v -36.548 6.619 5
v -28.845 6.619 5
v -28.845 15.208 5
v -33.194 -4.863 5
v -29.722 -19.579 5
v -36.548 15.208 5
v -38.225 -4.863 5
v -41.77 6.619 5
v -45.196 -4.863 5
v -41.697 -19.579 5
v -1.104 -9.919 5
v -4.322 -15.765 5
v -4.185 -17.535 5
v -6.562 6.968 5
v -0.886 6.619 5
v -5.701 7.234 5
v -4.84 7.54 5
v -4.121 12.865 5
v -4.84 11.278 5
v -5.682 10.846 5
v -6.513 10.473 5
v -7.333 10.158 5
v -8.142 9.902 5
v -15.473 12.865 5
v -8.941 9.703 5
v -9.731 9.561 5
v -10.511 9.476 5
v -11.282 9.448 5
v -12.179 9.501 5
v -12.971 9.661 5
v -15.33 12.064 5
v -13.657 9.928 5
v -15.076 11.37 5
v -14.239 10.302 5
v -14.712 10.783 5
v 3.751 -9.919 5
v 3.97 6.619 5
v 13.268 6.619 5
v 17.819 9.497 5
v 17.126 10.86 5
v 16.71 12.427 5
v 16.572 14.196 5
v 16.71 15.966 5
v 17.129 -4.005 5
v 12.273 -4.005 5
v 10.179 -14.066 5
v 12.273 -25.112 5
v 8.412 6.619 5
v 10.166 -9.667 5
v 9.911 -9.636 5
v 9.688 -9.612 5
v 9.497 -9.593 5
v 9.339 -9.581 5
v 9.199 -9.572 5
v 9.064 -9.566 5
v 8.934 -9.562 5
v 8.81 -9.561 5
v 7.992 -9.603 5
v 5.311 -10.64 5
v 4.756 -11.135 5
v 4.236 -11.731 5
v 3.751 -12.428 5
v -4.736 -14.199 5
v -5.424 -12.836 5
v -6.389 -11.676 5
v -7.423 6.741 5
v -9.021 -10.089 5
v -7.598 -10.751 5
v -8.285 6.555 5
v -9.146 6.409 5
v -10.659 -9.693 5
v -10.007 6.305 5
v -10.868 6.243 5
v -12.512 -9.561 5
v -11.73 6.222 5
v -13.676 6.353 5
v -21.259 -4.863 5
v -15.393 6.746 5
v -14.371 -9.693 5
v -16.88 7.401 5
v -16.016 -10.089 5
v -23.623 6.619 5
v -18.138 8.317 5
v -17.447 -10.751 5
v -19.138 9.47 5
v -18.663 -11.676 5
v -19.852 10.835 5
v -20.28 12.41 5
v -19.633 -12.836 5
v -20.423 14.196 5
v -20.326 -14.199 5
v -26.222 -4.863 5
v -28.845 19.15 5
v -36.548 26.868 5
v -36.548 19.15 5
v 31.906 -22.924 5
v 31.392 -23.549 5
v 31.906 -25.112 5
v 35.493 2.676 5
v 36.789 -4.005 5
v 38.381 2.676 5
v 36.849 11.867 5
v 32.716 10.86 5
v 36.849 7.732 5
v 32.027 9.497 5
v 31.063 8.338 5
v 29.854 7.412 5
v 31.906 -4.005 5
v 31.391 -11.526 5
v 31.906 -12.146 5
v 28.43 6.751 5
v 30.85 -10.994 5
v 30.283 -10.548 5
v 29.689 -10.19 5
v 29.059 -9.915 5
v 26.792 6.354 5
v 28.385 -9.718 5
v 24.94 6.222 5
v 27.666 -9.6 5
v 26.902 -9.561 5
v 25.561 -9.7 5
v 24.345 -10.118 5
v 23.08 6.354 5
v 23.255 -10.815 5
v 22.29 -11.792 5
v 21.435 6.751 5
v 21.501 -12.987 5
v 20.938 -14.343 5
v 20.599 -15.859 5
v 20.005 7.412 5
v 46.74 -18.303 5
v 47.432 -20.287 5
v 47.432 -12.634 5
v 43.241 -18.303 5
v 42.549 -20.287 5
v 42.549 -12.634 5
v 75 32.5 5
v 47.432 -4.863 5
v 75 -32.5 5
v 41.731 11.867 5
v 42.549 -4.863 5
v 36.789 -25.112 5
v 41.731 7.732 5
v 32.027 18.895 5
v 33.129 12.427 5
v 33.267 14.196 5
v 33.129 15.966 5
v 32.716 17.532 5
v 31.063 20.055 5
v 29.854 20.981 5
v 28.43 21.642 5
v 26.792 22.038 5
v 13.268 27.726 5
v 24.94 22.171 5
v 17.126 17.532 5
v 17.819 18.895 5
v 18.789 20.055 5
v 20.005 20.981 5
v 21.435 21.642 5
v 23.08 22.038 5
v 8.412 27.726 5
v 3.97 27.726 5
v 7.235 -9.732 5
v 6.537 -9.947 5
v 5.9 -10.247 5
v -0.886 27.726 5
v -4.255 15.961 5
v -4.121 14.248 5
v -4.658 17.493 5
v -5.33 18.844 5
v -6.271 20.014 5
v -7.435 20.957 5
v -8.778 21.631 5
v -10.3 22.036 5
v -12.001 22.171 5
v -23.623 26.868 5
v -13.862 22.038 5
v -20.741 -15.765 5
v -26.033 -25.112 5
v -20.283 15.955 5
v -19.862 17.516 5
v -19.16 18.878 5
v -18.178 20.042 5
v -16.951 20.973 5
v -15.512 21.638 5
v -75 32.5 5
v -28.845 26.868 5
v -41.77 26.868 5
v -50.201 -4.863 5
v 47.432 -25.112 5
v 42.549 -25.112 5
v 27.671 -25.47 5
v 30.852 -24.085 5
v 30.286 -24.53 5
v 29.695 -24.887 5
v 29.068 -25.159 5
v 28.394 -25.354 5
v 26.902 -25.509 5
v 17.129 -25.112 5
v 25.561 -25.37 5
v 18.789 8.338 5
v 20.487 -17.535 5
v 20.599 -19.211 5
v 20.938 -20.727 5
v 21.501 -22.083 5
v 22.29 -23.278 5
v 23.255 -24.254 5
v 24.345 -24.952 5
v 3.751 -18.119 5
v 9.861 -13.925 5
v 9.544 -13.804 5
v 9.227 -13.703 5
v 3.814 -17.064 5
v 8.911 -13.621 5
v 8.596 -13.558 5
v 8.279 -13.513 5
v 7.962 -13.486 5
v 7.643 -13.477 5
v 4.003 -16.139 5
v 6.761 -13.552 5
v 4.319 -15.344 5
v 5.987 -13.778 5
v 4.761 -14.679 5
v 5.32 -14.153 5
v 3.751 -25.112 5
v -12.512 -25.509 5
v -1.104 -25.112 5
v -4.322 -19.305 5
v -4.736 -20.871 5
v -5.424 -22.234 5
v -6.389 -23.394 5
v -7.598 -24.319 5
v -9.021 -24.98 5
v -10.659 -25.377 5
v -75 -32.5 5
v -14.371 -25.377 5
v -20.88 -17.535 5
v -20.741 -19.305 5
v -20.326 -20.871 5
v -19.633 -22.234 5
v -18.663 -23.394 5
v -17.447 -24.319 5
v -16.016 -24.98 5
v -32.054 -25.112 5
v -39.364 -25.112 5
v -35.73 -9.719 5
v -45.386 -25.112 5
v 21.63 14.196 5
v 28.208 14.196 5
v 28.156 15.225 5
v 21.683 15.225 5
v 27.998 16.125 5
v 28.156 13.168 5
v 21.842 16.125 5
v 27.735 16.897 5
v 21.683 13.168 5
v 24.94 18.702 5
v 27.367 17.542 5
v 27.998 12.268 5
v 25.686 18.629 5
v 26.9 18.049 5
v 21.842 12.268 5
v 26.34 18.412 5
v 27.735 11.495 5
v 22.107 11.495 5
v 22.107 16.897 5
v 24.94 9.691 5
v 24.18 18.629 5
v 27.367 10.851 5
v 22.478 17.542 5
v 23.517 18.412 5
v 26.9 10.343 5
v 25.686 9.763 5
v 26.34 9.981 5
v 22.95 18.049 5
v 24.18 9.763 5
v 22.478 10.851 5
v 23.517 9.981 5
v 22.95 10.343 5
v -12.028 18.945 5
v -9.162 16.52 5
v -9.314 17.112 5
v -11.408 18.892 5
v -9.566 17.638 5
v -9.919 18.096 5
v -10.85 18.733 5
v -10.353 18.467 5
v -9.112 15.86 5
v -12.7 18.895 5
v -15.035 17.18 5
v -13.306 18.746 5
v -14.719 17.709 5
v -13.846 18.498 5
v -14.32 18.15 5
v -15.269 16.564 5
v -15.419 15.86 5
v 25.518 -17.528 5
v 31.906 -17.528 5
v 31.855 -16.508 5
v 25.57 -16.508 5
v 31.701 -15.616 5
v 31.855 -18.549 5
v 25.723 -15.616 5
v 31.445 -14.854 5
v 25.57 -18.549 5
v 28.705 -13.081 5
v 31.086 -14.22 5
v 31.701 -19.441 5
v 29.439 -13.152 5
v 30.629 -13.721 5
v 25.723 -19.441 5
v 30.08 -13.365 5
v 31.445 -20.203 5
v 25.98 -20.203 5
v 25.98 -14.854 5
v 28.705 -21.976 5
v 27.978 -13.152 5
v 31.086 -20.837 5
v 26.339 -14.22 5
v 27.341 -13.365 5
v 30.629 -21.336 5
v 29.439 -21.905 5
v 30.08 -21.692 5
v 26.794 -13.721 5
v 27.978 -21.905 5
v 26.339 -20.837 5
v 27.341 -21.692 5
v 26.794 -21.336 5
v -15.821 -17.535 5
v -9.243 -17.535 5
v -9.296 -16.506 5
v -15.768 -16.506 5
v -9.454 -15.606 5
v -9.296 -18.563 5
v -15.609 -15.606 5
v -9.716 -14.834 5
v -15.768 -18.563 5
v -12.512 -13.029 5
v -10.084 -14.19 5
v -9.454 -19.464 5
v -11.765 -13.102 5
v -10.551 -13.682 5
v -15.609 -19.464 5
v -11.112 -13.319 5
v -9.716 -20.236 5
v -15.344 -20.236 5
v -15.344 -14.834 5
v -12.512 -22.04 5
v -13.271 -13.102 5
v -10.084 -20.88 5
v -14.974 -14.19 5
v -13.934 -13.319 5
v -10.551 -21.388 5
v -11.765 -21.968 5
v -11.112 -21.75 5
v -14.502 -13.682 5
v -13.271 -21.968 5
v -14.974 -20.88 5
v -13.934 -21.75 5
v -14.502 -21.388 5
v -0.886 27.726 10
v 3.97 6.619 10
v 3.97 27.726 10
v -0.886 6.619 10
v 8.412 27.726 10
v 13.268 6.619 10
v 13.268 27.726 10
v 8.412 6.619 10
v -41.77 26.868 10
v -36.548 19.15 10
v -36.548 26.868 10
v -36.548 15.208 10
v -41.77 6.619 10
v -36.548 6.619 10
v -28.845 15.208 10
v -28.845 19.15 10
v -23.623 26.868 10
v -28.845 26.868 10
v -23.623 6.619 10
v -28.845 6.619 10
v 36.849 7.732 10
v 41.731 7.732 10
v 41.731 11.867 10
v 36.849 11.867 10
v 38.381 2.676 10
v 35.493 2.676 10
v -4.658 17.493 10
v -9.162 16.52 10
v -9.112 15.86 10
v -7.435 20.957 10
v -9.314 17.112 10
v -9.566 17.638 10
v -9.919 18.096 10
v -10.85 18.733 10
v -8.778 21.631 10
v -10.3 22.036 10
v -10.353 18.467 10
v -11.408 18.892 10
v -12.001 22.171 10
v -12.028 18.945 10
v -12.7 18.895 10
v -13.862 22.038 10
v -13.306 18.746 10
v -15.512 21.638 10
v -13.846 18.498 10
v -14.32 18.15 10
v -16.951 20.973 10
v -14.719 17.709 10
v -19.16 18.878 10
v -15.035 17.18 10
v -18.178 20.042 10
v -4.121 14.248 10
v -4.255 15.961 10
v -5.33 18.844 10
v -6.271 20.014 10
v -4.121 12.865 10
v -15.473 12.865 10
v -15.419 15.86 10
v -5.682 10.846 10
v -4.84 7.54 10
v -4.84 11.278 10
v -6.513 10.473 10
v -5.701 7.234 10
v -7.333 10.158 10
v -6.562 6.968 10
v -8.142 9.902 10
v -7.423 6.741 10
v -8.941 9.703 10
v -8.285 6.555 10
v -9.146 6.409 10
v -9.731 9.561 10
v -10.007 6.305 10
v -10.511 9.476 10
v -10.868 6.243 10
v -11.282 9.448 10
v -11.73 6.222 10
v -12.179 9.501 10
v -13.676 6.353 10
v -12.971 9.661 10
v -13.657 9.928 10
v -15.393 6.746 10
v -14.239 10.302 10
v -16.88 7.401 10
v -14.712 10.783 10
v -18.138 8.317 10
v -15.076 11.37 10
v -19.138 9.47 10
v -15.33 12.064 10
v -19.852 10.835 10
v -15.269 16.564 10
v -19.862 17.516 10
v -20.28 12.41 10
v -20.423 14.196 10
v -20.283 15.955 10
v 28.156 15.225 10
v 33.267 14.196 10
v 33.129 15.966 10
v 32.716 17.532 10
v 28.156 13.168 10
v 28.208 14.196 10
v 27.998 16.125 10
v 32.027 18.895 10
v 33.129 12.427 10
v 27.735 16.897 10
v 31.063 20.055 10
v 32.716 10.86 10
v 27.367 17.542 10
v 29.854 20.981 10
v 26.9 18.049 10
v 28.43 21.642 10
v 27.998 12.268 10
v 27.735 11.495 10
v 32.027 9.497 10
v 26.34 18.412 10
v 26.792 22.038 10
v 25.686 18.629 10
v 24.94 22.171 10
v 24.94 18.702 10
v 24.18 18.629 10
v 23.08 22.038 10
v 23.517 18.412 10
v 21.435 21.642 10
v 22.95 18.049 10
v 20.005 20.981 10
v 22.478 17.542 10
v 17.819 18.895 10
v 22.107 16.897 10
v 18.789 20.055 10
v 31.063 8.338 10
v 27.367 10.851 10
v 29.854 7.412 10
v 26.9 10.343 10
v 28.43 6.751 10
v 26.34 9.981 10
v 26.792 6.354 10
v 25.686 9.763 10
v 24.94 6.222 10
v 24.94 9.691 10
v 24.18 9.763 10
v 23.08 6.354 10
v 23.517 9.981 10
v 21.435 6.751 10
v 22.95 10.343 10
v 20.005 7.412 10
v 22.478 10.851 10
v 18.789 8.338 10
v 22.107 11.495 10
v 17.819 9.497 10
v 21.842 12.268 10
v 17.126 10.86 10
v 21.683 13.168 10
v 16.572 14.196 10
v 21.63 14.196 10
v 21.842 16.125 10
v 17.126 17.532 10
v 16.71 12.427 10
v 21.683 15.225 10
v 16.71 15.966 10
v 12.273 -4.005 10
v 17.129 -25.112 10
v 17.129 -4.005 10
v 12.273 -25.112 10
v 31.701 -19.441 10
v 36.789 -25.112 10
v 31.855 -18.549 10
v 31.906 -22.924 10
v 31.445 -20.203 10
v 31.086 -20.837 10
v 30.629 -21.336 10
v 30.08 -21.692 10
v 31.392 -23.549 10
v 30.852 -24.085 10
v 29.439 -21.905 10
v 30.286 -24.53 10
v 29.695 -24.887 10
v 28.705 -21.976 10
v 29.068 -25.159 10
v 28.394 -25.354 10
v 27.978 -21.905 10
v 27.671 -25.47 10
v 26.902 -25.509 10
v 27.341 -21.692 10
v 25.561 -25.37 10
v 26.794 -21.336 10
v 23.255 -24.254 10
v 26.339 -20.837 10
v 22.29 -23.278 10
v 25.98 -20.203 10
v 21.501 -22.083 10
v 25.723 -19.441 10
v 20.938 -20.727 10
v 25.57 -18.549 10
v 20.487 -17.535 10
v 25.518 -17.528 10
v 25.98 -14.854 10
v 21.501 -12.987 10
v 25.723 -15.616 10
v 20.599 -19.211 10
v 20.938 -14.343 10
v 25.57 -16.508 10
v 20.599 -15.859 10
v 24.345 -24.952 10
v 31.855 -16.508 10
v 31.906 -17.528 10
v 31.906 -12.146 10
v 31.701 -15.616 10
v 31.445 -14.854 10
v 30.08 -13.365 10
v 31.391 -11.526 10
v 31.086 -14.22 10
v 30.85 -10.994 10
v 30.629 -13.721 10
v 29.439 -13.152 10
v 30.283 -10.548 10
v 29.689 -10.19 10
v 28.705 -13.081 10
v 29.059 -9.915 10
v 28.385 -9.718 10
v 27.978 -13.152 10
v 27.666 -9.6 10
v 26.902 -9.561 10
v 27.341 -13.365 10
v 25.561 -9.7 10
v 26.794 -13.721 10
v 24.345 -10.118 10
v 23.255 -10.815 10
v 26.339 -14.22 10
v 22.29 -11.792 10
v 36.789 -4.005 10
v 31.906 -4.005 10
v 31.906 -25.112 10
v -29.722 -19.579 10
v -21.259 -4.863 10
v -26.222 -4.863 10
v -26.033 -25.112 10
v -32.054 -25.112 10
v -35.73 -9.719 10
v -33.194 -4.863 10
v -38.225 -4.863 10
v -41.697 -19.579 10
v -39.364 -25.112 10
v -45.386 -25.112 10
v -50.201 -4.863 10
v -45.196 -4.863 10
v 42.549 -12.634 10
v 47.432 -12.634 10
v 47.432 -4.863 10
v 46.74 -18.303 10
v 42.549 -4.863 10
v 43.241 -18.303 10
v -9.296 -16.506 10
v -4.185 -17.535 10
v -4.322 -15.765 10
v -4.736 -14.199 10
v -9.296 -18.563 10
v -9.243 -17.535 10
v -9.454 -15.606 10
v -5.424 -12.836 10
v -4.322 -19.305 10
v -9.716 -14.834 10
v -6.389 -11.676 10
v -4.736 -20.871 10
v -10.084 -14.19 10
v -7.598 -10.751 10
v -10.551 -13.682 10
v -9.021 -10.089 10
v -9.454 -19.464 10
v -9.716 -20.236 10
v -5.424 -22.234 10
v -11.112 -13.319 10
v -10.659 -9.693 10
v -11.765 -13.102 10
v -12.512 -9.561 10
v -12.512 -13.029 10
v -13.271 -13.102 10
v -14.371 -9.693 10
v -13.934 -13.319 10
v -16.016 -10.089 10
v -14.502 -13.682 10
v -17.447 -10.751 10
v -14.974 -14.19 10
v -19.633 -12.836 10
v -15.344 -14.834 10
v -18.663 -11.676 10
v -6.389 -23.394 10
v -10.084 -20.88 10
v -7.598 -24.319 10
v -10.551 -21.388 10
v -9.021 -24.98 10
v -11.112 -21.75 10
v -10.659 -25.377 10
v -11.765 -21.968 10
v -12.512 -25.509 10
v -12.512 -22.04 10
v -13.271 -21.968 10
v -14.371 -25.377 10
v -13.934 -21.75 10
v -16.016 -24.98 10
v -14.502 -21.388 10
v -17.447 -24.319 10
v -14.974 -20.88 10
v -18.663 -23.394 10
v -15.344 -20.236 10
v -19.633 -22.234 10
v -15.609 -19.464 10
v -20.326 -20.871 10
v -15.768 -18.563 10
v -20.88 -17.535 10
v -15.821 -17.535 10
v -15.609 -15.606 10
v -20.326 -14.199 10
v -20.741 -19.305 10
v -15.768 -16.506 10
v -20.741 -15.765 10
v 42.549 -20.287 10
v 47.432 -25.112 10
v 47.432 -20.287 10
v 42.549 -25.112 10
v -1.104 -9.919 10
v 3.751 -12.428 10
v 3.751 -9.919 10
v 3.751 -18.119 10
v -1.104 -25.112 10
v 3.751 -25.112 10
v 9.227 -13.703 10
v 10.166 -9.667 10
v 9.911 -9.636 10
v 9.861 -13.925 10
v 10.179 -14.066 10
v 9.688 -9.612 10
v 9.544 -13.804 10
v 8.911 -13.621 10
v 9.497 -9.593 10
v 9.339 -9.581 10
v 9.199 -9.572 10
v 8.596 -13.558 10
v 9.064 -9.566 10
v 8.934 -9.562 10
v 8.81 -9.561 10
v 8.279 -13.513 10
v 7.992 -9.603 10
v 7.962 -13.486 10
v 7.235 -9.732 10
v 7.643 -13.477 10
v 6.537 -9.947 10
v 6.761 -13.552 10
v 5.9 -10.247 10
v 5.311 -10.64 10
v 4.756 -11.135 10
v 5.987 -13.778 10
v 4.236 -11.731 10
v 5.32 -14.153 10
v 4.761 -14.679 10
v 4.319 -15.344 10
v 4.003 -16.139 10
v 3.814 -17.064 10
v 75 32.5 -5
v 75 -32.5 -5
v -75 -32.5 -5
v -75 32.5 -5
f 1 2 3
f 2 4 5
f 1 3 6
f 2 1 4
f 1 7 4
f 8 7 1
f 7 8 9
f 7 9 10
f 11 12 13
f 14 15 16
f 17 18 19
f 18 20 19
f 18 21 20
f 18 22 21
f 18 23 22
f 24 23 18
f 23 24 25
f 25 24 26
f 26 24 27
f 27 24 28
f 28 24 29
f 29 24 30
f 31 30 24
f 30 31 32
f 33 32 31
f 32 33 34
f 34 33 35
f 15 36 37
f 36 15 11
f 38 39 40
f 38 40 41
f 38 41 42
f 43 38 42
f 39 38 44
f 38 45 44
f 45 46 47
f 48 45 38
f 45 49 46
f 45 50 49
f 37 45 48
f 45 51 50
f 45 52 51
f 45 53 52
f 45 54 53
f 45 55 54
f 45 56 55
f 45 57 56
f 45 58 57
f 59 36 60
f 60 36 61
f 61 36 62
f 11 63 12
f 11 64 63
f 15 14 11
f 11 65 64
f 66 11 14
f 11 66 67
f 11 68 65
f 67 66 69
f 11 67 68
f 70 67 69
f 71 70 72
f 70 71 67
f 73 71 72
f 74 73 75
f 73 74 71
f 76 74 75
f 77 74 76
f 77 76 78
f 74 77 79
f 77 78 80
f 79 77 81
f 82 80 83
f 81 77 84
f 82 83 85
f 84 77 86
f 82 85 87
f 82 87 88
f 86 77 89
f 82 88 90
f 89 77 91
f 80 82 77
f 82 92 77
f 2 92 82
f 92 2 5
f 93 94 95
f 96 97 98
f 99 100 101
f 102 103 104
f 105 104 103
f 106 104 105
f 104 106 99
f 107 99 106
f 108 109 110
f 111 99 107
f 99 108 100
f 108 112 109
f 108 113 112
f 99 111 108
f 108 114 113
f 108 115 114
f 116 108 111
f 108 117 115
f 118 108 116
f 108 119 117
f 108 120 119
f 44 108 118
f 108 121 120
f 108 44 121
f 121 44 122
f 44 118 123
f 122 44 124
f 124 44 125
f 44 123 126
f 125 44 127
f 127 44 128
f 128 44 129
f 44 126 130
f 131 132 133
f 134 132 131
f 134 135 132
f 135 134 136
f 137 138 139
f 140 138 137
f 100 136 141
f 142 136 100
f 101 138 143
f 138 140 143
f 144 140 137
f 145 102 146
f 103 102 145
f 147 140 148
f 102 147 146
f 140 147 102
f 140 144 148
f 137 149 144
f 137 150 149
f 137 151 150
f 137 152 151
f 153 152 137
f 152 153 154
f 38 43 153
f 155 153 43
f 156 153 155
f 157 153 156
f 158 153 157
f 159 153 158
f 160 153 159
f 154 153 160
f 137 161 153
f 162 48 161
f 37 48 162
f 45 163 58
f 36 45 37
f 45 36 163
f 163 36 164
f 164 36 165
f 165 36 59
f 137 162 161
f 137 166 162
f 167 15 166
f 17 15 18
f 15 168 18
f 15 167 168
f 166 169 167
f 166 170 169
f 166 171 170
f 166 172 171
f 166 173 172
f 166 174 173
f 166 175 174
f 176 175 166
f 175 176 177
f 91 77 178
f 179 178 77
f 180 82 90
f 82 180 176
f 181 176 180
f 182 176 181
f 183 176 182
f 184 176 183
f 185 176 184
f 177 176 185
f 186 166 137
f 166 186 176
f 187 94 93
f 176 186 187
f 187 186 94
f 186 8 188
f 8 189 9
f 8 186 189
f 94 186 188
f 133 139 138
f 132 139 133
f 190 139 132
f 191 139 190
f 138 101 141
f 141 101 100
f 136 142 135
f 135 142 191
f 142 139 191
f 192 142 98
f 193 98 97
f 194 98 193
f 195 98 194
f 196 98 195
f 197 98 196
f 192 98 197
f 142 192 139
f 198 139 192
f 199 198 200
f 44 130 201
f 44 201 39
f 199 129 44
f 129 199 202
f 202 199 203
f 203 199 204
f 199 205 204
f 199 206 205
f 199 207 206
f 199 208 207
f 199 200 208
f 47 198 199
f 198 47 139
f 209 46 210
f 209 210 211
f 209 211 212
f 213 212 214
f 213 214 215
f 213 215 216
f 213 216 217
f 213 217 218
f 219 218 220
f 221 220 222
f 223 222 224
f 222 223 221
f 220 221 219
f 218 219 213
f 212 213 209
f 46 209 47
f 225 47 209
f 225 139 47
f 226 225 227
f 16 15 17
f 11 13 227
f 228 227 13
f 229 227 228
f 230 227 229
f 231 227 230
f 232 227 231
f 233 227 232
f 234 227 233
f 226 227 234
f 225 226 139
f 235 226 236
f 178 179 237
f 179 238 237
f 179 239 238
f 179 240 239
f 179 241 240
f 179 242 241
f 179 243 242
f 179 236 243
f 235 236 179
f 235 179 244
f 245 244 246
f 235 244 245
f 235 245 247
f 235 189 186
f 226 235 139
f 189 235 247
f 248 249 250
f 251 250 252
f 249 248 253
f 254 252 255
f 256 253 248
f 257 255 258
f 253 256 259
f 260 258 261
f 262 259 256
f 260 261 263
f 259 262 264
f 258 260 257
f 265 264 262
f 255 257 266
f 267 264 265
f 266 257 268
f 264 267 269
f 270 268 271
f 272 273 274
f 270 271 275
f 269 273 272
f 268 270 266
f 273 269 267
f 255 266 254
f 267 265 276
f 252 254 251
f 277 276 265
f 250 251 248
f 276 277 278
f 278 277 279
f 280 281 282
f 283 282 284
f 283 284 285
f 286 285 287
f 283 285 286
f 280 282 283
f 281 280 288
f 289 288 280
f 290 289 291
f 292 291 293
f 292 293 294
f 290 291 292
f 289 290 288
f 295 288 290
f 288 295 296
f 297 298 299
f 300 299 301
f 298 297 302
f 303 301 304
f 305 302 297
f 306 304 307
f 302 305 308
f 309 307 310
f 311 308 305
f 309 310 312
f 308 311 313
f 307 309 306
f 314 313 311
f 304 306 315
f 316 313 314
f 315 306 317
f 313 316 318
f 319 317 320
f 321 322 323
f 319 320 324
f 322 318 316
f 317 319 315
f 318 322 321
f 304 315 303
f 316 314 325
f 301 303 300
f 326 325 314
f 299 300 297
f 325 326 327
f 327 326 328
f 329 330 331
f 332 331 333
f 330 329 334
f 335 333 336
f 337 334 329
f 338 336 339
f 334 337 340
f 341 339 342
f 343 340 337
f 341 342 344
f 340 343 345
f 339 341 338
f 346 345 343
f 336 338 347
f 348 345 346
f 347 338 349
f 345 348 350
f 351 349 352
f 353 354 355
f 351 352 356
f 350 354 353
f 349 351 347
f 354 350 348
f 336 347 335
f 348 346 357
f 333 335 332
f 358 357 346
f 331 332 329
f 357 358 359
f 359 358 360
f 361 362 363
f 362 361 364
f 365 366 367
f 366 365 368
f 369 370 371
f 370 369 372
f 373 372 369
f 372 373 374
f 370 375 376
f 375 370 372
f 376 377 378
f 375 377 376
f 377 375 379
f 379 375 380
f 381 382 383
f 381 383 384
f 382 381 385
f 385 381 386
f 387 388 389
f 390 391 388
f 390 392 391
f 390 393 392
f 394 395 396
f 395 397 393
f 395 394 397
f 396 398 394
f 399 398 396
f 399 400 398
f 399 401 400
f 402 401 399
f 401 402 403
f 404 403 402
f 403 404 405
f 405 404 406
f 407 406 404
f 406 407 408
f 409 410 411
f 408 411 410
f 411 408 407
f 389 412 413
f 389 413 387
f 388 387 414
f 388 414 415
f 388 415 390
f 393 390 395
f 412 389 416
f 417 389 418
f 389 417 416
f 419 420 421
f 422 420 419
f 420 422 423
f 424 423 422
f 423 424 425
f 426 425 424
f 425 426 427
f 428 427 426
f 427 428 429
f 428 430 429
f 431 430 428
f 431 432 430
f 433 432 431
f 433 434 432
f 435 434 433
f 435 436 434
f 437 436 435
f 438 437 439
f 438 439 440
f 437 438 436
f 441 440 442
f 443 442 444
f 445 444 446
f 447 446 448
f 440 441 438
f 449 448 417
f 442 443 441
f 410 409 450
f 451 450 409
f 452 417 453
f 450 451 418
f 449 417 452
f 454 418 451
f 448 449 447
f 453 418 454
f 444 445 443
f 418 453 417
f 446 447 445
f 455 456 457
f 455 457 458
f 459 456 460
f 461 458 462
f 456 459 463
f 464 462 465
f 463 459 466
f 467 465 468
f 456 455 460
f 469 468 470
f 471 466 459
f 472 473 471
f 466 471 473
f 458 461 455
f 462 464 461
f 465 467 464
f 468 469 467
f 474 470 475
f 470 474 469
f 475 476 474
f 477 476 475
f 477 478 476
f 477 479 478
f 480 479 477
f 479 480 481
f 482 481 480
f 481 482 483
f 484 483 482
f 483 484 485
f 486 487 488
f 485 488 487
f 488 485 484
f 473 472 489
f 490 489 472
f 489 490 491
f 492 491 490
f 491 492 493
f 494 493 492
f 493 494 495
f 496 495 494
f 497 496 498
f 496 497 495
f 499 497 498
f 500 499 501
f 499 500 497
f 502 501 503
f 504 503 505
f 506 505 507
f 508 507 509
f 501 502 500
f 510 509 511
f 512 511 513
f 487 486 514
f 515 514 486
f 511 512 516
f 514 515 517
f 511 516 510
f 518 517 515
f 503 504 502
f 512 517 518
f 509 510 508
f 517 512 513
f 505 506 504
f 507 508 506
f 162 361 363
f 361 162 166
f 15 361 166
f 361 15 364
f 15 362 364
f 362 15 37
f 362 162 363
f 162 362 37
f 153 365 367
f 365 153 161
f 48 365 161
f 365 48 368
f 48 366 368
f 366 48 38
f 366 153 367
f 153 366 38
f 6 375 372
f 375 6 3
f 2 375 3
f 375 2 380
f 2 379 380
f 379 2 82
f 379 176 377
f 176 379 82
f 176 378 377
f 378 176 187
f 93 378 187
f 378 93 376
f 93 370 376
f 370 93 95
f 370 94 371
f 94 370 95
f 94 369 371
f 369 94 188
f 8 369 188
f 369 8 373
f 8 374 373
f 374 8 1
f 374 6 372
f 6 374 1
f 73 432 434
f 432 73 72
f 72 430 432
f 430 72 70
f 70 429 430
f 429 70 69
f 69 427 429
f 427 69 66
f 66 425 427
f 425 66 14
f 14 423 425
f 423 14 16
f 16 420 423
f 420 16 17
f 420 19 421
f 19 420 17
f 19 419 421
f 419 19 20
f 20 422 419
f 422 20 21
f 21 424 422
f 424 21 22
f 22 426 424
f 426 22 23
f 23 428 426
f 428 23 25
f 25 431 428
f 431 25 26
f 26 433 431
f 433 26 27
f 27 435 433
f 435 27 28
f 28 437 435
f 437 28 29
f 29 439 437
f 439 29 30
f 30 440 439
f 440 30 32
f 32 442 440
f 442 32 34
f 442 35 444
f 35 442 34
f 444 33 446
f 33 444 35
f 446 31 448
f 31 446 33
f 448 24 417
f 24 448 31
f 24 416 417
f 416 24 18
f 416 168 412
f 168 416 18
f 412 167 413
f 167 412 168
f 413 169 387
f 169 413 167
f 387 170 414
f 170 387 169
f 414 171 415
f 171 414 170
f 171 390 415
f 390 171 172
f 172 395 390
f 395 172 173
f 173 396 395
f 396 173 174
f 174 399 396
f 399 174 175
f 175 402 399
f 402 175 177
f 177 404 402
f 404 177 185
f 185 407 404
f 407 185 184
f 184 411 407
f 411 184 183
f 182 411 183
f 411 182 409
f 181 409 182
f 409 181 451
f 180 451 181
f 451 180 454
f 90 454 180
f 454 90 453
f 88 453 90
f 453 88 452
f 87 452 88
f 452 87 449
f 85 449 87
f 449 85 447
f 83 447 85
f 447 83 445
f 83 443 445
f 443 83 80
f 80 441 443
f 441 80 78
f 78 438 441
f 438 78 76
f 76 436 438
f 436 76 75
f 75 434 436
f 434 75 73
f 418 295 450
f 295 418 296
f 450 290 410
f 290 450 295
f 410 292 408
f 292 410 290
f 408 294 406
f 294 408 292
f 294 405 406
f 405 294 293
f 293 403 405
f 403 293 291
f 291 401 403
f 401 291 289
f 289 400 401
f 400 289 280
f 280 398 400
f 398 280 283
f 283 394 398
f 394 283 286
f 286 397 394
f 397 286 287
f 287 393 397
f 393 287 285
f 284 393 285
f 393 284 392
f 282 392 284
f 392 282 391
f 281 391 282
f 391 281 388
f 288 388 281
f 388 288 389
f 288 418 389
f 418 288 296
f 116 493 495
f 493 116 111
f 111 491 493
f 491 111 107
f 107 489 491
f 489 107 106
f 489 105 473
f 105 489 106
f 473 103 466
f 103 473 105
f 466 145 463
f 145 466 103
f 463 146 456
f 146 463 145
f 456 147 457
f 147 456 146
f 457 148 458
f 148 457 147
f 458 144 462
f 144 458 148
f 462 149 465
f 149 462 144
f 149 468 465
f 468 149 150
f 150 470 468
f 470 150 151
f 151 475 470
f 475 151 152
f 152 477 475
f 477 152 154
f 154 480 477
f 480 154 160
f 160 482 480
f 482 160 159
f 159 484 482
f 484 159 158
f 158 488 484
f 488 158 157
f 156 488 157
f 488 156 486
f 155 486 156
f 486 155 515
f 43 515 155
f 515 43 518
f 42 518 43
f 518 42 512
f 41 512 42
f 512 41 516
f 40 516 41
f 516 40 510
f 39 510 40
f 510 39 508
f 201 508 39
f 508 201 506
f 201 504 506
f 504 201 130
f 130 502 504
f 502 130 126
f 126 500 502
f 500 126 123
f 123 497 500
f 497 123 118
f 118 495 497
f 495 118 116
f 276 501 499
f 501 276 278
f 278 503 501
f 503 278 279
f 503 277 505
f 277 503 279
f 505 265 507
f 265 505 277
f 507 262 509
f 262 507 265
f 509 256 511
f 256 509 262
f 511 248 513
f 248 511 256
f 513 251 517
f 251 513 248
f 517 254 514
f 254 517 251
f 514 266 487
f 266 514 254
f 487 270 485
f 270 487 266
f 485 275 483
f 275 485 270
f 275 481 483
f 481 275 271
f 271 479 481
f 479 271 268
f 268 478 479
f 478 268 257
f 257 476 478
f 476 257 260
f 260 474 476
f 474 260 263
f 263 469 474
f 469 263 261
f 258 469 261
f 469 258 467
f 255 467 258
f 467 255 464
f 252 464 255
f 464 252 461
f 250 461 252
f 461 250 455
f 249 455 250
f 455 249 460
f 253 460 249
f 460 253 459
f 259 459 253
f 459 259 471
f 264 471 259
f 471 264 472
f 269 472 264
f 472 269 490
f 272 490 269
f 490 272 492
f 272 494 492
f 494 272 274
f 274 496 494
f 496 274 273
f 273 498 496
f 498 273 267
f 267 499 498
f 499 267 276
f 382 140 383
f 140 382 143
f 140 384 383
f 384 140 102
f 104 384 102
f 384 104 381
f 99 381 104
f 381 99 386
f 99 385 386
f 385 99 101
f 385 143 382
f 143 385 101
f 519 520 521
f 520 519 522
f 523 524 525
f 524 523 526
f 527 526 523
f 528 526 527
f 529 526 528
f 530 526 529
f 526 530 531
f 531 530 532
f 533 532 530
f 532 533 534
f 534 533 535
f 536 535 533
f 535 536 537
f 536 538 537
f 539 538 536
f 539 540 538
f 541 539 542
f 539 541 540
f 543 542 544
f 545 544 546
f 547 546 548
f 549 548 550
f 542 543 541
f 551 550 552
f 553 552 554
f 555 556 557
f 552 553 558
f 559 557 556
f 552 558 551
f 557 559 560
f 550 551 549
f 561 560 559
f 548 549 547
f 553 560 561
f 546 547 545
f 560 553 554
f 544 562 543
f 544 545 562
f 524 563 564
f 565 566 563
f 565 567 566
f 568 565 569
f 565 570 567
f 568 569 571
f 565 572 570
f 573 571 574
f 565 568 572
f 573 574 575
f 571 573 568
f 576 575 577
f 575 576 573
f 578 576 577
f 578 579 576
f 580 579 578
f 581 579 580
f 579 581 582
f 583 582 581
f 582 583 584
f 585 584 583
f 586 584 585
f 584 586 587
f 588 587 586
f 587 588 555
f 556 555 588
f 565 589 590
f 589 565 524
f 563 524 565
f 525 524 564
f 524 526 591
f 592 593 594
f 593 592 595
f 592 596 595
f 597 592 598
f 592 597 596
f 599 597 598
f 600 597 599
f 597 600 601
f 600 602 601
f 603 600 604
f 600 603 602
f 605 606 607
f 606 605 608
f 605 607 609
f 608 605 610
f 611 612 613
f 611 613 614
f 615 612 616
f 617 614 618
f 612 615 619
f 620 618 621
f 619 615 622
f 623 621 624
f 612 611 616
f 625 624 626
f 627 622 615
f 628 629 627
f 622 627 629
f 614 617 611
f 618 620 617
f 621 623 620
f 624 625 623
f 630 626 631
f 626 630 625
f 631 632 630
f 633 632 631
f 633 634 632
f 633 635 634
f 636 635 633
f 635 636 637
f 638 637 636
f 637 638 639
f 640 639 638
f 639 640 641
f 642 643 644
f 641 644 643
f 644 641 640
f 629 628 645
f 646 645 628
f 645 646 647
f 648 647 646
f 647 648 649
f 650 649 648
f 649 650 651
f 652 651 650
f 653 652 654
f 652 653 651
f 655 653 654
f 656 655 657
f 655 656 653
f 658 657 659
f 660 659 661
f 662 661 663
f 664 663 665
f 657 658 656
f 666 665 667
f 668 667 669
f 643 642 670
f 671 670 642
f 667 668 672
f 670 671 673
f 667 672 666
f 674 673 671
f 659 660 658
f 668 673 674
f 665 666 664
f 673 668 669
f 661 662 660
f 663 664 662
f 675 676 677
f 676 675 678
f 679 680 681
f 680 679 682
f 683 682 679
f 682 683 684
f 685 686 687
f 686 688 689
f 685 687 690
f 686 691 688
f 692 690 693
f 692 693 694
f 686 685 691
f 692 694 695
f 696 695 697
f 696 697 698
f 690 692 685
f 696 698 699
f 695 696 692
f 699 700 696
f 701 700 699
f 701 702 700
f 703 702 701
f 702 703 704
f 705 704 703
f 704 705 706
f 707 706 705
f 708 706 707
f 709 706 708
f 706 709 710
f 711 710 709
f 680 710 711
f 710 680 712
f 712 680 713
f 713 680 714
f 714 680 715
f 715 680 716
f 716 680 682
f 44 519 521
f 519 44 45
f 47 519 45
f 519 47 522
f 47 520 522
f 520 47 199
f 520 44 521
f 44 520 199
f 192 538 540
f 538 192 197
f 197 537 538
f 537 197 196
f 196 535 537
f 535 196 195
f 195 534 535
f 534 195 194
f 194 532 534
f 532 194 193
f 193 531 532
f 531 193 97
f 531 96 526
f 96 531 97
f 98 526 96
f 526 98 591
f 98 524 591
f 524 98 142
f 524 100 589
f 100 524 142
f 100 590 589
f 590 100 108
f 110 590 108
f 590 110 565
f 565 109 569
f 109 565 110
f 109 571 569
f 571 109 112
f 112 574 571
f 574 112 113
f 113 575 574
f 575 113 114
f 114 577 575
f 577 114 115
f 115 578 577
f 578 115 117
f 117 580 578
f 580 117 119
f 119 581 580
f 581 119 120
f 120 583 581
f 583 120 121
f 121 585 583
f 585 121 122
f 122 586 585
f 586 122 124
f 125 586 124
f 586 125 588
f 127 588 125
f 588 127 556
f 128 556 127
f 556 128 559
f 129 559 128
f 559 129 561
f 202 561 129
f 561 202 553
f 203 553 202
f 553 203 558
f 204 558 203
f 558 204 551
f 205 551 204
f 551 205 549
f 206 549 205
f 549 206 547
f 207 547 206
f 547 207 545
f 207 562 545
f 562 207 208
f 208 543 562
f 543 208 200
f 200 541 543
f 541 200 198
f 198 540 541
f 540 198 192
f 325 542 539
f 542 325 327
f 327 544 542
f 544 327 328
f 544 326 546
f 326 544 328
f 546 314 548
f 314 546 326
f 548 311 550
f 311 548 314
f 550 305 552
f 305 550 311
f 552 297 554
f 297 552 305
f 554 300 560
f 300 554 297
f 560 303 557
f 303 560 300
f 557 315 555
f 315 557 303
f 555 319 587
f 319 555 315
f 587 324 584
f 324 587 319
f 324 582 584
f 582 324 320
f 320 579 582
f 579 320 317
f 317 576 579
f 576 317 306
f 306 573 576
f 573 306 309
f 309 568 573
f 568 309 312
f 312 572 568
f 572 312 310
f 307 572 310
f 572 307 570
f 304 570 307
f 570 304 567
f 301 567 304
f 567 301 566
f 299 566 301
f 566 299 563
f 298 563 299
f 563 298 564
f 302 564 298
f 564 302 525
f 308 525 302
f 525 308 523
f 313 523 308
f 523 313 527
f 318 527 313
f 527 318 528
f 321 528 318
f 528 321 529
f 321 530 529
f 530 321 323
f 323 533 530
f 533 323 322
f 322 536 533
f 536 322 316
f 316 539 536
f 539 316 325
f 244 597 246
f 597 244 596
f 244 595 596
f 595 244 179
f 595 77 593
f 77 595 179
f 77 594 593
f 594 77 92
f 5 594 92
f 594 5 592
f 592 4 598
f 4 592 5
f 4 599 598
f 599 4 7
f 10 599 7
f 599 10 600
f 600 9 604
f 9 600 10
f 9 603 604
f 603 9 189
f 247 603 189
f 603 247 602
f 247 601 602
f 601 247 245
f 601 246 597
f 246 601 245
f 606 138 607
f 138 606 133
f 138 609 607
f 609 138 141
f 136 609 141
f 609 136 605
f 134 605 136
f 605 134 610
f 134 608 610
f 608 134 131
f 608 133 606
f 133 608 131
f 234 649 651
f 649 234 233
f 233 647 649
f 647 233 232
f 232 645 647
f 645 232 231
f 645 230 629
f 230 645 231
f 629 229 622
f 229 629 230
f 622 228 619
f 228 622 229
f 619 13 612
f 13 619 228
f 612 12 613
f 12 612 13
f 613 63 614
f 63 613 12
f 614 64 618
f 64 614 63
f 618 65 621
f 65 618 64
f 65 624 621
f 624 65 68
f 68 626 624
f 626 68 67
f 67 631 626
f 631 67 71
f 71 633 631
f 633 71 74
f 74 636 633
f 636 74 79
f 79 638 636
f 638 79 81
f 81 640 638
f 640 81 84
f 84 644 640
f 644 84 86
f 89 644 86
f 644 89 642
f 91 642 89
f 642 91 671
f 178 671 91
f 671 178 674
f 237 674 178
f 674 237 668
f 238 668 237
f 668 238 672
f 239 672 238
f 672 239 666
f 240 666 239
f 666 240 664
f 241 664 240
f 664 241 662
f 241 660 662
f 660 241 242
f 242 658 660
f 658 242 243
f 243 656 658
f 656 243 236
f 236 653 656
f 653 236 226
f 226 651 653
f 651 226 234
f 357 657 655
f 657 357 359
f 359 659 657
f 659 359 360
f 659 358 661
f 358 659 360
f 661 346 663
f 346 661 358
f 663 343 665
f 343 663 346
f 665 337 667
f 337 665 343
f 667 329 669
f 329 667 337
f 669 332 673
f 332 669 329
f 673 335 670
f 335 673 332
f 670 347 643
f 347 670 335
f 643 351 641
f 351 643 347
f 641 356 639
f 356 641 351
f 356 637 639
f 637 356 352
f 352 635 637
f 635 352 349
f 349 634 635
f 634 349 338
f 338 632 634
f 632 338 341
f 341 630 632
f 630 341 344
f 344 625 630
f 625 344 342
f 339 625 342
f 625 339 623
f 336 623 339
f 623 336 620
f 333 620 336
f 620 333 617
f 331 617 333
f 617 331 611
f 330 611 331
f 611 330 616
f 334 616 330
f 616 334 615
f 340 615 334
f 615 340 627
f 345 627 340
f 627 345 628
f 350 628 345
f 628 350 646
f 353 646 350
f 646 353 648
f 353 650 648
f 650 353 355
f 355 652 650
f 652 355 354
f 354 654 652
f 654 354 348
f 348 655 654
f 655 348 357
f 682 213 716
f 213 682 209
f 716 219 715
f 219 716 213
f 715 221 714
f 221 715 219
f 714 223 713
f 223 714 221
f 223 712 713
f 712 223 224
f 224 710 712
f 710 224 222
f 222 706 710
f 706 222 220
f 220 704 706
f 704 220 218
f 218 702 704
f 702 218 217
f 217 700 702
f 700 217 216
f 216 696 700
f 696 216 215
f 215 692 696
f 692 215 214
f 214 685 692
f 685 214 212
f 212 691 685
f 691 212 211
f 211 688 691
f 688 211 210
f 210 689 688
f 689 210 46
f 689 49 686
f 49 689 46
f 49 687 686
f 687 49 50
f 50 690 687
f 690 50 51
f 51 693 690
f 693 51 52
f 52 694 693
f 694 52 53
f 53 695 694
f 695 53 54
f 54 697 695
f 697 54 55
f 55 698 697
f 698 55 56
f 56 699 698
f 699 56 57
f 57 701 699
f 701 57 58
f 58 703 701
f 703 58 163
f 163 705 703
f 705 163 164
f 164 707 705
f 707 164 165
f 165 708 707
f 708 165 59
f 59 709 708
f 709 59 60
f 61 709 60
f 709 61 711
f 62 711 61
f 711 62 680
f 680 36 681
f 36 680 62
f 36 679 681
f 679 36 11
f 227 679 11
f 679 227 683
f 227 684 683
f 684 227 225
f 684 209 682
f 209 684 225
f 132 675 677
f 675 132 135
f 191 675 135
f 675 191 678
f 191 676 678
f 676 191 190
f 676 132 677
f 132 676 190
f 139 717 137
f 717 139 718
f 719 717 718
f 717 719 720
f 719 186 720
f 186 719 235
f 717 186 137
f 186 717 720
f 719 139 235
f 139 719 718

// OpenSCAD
// *************************
// Customizable Sign Creator
// By BaranCODE
// *************************

// in mm
plate_length = 150;
// in mm
plate_width = 65;
// in mm
plate_height = 10;
// in mm
text_height = 5;
// use \n to add a new line
text_content = "Hello,\nWorld!";
font_size = 20;
// in mm (if you have multiple lines)
line_separation = 30;

color("gray") cube([plate_length, plate_width, plate_height], true);

contents = split(text_content, "\n");
color("white")
translate([0, (len(contents)-1)*line_separation/2, 0])
for (i = [0 : len(contents)-1]){
    translate([0, -i*line_separation, plate_height/2])
    linear_extrude(height = text_height, center = false)
    text(contents[i], font_size,
        "Open Sans:style=Bold",
        halign="center", valign="center");
}



// From OpenSCAD Library by roipoussiere
// http://www.thingiverse.com/thing:1237203
function split(str, sep=" ", i=0, word="", v=[]) =
	i == len(str) ? concat(v, word) :
	str[i] == sep ? split(str, sep, i+1, "", concat(v, word)) :
	split(str, sep, i+1, str(word, str[i]), v);
